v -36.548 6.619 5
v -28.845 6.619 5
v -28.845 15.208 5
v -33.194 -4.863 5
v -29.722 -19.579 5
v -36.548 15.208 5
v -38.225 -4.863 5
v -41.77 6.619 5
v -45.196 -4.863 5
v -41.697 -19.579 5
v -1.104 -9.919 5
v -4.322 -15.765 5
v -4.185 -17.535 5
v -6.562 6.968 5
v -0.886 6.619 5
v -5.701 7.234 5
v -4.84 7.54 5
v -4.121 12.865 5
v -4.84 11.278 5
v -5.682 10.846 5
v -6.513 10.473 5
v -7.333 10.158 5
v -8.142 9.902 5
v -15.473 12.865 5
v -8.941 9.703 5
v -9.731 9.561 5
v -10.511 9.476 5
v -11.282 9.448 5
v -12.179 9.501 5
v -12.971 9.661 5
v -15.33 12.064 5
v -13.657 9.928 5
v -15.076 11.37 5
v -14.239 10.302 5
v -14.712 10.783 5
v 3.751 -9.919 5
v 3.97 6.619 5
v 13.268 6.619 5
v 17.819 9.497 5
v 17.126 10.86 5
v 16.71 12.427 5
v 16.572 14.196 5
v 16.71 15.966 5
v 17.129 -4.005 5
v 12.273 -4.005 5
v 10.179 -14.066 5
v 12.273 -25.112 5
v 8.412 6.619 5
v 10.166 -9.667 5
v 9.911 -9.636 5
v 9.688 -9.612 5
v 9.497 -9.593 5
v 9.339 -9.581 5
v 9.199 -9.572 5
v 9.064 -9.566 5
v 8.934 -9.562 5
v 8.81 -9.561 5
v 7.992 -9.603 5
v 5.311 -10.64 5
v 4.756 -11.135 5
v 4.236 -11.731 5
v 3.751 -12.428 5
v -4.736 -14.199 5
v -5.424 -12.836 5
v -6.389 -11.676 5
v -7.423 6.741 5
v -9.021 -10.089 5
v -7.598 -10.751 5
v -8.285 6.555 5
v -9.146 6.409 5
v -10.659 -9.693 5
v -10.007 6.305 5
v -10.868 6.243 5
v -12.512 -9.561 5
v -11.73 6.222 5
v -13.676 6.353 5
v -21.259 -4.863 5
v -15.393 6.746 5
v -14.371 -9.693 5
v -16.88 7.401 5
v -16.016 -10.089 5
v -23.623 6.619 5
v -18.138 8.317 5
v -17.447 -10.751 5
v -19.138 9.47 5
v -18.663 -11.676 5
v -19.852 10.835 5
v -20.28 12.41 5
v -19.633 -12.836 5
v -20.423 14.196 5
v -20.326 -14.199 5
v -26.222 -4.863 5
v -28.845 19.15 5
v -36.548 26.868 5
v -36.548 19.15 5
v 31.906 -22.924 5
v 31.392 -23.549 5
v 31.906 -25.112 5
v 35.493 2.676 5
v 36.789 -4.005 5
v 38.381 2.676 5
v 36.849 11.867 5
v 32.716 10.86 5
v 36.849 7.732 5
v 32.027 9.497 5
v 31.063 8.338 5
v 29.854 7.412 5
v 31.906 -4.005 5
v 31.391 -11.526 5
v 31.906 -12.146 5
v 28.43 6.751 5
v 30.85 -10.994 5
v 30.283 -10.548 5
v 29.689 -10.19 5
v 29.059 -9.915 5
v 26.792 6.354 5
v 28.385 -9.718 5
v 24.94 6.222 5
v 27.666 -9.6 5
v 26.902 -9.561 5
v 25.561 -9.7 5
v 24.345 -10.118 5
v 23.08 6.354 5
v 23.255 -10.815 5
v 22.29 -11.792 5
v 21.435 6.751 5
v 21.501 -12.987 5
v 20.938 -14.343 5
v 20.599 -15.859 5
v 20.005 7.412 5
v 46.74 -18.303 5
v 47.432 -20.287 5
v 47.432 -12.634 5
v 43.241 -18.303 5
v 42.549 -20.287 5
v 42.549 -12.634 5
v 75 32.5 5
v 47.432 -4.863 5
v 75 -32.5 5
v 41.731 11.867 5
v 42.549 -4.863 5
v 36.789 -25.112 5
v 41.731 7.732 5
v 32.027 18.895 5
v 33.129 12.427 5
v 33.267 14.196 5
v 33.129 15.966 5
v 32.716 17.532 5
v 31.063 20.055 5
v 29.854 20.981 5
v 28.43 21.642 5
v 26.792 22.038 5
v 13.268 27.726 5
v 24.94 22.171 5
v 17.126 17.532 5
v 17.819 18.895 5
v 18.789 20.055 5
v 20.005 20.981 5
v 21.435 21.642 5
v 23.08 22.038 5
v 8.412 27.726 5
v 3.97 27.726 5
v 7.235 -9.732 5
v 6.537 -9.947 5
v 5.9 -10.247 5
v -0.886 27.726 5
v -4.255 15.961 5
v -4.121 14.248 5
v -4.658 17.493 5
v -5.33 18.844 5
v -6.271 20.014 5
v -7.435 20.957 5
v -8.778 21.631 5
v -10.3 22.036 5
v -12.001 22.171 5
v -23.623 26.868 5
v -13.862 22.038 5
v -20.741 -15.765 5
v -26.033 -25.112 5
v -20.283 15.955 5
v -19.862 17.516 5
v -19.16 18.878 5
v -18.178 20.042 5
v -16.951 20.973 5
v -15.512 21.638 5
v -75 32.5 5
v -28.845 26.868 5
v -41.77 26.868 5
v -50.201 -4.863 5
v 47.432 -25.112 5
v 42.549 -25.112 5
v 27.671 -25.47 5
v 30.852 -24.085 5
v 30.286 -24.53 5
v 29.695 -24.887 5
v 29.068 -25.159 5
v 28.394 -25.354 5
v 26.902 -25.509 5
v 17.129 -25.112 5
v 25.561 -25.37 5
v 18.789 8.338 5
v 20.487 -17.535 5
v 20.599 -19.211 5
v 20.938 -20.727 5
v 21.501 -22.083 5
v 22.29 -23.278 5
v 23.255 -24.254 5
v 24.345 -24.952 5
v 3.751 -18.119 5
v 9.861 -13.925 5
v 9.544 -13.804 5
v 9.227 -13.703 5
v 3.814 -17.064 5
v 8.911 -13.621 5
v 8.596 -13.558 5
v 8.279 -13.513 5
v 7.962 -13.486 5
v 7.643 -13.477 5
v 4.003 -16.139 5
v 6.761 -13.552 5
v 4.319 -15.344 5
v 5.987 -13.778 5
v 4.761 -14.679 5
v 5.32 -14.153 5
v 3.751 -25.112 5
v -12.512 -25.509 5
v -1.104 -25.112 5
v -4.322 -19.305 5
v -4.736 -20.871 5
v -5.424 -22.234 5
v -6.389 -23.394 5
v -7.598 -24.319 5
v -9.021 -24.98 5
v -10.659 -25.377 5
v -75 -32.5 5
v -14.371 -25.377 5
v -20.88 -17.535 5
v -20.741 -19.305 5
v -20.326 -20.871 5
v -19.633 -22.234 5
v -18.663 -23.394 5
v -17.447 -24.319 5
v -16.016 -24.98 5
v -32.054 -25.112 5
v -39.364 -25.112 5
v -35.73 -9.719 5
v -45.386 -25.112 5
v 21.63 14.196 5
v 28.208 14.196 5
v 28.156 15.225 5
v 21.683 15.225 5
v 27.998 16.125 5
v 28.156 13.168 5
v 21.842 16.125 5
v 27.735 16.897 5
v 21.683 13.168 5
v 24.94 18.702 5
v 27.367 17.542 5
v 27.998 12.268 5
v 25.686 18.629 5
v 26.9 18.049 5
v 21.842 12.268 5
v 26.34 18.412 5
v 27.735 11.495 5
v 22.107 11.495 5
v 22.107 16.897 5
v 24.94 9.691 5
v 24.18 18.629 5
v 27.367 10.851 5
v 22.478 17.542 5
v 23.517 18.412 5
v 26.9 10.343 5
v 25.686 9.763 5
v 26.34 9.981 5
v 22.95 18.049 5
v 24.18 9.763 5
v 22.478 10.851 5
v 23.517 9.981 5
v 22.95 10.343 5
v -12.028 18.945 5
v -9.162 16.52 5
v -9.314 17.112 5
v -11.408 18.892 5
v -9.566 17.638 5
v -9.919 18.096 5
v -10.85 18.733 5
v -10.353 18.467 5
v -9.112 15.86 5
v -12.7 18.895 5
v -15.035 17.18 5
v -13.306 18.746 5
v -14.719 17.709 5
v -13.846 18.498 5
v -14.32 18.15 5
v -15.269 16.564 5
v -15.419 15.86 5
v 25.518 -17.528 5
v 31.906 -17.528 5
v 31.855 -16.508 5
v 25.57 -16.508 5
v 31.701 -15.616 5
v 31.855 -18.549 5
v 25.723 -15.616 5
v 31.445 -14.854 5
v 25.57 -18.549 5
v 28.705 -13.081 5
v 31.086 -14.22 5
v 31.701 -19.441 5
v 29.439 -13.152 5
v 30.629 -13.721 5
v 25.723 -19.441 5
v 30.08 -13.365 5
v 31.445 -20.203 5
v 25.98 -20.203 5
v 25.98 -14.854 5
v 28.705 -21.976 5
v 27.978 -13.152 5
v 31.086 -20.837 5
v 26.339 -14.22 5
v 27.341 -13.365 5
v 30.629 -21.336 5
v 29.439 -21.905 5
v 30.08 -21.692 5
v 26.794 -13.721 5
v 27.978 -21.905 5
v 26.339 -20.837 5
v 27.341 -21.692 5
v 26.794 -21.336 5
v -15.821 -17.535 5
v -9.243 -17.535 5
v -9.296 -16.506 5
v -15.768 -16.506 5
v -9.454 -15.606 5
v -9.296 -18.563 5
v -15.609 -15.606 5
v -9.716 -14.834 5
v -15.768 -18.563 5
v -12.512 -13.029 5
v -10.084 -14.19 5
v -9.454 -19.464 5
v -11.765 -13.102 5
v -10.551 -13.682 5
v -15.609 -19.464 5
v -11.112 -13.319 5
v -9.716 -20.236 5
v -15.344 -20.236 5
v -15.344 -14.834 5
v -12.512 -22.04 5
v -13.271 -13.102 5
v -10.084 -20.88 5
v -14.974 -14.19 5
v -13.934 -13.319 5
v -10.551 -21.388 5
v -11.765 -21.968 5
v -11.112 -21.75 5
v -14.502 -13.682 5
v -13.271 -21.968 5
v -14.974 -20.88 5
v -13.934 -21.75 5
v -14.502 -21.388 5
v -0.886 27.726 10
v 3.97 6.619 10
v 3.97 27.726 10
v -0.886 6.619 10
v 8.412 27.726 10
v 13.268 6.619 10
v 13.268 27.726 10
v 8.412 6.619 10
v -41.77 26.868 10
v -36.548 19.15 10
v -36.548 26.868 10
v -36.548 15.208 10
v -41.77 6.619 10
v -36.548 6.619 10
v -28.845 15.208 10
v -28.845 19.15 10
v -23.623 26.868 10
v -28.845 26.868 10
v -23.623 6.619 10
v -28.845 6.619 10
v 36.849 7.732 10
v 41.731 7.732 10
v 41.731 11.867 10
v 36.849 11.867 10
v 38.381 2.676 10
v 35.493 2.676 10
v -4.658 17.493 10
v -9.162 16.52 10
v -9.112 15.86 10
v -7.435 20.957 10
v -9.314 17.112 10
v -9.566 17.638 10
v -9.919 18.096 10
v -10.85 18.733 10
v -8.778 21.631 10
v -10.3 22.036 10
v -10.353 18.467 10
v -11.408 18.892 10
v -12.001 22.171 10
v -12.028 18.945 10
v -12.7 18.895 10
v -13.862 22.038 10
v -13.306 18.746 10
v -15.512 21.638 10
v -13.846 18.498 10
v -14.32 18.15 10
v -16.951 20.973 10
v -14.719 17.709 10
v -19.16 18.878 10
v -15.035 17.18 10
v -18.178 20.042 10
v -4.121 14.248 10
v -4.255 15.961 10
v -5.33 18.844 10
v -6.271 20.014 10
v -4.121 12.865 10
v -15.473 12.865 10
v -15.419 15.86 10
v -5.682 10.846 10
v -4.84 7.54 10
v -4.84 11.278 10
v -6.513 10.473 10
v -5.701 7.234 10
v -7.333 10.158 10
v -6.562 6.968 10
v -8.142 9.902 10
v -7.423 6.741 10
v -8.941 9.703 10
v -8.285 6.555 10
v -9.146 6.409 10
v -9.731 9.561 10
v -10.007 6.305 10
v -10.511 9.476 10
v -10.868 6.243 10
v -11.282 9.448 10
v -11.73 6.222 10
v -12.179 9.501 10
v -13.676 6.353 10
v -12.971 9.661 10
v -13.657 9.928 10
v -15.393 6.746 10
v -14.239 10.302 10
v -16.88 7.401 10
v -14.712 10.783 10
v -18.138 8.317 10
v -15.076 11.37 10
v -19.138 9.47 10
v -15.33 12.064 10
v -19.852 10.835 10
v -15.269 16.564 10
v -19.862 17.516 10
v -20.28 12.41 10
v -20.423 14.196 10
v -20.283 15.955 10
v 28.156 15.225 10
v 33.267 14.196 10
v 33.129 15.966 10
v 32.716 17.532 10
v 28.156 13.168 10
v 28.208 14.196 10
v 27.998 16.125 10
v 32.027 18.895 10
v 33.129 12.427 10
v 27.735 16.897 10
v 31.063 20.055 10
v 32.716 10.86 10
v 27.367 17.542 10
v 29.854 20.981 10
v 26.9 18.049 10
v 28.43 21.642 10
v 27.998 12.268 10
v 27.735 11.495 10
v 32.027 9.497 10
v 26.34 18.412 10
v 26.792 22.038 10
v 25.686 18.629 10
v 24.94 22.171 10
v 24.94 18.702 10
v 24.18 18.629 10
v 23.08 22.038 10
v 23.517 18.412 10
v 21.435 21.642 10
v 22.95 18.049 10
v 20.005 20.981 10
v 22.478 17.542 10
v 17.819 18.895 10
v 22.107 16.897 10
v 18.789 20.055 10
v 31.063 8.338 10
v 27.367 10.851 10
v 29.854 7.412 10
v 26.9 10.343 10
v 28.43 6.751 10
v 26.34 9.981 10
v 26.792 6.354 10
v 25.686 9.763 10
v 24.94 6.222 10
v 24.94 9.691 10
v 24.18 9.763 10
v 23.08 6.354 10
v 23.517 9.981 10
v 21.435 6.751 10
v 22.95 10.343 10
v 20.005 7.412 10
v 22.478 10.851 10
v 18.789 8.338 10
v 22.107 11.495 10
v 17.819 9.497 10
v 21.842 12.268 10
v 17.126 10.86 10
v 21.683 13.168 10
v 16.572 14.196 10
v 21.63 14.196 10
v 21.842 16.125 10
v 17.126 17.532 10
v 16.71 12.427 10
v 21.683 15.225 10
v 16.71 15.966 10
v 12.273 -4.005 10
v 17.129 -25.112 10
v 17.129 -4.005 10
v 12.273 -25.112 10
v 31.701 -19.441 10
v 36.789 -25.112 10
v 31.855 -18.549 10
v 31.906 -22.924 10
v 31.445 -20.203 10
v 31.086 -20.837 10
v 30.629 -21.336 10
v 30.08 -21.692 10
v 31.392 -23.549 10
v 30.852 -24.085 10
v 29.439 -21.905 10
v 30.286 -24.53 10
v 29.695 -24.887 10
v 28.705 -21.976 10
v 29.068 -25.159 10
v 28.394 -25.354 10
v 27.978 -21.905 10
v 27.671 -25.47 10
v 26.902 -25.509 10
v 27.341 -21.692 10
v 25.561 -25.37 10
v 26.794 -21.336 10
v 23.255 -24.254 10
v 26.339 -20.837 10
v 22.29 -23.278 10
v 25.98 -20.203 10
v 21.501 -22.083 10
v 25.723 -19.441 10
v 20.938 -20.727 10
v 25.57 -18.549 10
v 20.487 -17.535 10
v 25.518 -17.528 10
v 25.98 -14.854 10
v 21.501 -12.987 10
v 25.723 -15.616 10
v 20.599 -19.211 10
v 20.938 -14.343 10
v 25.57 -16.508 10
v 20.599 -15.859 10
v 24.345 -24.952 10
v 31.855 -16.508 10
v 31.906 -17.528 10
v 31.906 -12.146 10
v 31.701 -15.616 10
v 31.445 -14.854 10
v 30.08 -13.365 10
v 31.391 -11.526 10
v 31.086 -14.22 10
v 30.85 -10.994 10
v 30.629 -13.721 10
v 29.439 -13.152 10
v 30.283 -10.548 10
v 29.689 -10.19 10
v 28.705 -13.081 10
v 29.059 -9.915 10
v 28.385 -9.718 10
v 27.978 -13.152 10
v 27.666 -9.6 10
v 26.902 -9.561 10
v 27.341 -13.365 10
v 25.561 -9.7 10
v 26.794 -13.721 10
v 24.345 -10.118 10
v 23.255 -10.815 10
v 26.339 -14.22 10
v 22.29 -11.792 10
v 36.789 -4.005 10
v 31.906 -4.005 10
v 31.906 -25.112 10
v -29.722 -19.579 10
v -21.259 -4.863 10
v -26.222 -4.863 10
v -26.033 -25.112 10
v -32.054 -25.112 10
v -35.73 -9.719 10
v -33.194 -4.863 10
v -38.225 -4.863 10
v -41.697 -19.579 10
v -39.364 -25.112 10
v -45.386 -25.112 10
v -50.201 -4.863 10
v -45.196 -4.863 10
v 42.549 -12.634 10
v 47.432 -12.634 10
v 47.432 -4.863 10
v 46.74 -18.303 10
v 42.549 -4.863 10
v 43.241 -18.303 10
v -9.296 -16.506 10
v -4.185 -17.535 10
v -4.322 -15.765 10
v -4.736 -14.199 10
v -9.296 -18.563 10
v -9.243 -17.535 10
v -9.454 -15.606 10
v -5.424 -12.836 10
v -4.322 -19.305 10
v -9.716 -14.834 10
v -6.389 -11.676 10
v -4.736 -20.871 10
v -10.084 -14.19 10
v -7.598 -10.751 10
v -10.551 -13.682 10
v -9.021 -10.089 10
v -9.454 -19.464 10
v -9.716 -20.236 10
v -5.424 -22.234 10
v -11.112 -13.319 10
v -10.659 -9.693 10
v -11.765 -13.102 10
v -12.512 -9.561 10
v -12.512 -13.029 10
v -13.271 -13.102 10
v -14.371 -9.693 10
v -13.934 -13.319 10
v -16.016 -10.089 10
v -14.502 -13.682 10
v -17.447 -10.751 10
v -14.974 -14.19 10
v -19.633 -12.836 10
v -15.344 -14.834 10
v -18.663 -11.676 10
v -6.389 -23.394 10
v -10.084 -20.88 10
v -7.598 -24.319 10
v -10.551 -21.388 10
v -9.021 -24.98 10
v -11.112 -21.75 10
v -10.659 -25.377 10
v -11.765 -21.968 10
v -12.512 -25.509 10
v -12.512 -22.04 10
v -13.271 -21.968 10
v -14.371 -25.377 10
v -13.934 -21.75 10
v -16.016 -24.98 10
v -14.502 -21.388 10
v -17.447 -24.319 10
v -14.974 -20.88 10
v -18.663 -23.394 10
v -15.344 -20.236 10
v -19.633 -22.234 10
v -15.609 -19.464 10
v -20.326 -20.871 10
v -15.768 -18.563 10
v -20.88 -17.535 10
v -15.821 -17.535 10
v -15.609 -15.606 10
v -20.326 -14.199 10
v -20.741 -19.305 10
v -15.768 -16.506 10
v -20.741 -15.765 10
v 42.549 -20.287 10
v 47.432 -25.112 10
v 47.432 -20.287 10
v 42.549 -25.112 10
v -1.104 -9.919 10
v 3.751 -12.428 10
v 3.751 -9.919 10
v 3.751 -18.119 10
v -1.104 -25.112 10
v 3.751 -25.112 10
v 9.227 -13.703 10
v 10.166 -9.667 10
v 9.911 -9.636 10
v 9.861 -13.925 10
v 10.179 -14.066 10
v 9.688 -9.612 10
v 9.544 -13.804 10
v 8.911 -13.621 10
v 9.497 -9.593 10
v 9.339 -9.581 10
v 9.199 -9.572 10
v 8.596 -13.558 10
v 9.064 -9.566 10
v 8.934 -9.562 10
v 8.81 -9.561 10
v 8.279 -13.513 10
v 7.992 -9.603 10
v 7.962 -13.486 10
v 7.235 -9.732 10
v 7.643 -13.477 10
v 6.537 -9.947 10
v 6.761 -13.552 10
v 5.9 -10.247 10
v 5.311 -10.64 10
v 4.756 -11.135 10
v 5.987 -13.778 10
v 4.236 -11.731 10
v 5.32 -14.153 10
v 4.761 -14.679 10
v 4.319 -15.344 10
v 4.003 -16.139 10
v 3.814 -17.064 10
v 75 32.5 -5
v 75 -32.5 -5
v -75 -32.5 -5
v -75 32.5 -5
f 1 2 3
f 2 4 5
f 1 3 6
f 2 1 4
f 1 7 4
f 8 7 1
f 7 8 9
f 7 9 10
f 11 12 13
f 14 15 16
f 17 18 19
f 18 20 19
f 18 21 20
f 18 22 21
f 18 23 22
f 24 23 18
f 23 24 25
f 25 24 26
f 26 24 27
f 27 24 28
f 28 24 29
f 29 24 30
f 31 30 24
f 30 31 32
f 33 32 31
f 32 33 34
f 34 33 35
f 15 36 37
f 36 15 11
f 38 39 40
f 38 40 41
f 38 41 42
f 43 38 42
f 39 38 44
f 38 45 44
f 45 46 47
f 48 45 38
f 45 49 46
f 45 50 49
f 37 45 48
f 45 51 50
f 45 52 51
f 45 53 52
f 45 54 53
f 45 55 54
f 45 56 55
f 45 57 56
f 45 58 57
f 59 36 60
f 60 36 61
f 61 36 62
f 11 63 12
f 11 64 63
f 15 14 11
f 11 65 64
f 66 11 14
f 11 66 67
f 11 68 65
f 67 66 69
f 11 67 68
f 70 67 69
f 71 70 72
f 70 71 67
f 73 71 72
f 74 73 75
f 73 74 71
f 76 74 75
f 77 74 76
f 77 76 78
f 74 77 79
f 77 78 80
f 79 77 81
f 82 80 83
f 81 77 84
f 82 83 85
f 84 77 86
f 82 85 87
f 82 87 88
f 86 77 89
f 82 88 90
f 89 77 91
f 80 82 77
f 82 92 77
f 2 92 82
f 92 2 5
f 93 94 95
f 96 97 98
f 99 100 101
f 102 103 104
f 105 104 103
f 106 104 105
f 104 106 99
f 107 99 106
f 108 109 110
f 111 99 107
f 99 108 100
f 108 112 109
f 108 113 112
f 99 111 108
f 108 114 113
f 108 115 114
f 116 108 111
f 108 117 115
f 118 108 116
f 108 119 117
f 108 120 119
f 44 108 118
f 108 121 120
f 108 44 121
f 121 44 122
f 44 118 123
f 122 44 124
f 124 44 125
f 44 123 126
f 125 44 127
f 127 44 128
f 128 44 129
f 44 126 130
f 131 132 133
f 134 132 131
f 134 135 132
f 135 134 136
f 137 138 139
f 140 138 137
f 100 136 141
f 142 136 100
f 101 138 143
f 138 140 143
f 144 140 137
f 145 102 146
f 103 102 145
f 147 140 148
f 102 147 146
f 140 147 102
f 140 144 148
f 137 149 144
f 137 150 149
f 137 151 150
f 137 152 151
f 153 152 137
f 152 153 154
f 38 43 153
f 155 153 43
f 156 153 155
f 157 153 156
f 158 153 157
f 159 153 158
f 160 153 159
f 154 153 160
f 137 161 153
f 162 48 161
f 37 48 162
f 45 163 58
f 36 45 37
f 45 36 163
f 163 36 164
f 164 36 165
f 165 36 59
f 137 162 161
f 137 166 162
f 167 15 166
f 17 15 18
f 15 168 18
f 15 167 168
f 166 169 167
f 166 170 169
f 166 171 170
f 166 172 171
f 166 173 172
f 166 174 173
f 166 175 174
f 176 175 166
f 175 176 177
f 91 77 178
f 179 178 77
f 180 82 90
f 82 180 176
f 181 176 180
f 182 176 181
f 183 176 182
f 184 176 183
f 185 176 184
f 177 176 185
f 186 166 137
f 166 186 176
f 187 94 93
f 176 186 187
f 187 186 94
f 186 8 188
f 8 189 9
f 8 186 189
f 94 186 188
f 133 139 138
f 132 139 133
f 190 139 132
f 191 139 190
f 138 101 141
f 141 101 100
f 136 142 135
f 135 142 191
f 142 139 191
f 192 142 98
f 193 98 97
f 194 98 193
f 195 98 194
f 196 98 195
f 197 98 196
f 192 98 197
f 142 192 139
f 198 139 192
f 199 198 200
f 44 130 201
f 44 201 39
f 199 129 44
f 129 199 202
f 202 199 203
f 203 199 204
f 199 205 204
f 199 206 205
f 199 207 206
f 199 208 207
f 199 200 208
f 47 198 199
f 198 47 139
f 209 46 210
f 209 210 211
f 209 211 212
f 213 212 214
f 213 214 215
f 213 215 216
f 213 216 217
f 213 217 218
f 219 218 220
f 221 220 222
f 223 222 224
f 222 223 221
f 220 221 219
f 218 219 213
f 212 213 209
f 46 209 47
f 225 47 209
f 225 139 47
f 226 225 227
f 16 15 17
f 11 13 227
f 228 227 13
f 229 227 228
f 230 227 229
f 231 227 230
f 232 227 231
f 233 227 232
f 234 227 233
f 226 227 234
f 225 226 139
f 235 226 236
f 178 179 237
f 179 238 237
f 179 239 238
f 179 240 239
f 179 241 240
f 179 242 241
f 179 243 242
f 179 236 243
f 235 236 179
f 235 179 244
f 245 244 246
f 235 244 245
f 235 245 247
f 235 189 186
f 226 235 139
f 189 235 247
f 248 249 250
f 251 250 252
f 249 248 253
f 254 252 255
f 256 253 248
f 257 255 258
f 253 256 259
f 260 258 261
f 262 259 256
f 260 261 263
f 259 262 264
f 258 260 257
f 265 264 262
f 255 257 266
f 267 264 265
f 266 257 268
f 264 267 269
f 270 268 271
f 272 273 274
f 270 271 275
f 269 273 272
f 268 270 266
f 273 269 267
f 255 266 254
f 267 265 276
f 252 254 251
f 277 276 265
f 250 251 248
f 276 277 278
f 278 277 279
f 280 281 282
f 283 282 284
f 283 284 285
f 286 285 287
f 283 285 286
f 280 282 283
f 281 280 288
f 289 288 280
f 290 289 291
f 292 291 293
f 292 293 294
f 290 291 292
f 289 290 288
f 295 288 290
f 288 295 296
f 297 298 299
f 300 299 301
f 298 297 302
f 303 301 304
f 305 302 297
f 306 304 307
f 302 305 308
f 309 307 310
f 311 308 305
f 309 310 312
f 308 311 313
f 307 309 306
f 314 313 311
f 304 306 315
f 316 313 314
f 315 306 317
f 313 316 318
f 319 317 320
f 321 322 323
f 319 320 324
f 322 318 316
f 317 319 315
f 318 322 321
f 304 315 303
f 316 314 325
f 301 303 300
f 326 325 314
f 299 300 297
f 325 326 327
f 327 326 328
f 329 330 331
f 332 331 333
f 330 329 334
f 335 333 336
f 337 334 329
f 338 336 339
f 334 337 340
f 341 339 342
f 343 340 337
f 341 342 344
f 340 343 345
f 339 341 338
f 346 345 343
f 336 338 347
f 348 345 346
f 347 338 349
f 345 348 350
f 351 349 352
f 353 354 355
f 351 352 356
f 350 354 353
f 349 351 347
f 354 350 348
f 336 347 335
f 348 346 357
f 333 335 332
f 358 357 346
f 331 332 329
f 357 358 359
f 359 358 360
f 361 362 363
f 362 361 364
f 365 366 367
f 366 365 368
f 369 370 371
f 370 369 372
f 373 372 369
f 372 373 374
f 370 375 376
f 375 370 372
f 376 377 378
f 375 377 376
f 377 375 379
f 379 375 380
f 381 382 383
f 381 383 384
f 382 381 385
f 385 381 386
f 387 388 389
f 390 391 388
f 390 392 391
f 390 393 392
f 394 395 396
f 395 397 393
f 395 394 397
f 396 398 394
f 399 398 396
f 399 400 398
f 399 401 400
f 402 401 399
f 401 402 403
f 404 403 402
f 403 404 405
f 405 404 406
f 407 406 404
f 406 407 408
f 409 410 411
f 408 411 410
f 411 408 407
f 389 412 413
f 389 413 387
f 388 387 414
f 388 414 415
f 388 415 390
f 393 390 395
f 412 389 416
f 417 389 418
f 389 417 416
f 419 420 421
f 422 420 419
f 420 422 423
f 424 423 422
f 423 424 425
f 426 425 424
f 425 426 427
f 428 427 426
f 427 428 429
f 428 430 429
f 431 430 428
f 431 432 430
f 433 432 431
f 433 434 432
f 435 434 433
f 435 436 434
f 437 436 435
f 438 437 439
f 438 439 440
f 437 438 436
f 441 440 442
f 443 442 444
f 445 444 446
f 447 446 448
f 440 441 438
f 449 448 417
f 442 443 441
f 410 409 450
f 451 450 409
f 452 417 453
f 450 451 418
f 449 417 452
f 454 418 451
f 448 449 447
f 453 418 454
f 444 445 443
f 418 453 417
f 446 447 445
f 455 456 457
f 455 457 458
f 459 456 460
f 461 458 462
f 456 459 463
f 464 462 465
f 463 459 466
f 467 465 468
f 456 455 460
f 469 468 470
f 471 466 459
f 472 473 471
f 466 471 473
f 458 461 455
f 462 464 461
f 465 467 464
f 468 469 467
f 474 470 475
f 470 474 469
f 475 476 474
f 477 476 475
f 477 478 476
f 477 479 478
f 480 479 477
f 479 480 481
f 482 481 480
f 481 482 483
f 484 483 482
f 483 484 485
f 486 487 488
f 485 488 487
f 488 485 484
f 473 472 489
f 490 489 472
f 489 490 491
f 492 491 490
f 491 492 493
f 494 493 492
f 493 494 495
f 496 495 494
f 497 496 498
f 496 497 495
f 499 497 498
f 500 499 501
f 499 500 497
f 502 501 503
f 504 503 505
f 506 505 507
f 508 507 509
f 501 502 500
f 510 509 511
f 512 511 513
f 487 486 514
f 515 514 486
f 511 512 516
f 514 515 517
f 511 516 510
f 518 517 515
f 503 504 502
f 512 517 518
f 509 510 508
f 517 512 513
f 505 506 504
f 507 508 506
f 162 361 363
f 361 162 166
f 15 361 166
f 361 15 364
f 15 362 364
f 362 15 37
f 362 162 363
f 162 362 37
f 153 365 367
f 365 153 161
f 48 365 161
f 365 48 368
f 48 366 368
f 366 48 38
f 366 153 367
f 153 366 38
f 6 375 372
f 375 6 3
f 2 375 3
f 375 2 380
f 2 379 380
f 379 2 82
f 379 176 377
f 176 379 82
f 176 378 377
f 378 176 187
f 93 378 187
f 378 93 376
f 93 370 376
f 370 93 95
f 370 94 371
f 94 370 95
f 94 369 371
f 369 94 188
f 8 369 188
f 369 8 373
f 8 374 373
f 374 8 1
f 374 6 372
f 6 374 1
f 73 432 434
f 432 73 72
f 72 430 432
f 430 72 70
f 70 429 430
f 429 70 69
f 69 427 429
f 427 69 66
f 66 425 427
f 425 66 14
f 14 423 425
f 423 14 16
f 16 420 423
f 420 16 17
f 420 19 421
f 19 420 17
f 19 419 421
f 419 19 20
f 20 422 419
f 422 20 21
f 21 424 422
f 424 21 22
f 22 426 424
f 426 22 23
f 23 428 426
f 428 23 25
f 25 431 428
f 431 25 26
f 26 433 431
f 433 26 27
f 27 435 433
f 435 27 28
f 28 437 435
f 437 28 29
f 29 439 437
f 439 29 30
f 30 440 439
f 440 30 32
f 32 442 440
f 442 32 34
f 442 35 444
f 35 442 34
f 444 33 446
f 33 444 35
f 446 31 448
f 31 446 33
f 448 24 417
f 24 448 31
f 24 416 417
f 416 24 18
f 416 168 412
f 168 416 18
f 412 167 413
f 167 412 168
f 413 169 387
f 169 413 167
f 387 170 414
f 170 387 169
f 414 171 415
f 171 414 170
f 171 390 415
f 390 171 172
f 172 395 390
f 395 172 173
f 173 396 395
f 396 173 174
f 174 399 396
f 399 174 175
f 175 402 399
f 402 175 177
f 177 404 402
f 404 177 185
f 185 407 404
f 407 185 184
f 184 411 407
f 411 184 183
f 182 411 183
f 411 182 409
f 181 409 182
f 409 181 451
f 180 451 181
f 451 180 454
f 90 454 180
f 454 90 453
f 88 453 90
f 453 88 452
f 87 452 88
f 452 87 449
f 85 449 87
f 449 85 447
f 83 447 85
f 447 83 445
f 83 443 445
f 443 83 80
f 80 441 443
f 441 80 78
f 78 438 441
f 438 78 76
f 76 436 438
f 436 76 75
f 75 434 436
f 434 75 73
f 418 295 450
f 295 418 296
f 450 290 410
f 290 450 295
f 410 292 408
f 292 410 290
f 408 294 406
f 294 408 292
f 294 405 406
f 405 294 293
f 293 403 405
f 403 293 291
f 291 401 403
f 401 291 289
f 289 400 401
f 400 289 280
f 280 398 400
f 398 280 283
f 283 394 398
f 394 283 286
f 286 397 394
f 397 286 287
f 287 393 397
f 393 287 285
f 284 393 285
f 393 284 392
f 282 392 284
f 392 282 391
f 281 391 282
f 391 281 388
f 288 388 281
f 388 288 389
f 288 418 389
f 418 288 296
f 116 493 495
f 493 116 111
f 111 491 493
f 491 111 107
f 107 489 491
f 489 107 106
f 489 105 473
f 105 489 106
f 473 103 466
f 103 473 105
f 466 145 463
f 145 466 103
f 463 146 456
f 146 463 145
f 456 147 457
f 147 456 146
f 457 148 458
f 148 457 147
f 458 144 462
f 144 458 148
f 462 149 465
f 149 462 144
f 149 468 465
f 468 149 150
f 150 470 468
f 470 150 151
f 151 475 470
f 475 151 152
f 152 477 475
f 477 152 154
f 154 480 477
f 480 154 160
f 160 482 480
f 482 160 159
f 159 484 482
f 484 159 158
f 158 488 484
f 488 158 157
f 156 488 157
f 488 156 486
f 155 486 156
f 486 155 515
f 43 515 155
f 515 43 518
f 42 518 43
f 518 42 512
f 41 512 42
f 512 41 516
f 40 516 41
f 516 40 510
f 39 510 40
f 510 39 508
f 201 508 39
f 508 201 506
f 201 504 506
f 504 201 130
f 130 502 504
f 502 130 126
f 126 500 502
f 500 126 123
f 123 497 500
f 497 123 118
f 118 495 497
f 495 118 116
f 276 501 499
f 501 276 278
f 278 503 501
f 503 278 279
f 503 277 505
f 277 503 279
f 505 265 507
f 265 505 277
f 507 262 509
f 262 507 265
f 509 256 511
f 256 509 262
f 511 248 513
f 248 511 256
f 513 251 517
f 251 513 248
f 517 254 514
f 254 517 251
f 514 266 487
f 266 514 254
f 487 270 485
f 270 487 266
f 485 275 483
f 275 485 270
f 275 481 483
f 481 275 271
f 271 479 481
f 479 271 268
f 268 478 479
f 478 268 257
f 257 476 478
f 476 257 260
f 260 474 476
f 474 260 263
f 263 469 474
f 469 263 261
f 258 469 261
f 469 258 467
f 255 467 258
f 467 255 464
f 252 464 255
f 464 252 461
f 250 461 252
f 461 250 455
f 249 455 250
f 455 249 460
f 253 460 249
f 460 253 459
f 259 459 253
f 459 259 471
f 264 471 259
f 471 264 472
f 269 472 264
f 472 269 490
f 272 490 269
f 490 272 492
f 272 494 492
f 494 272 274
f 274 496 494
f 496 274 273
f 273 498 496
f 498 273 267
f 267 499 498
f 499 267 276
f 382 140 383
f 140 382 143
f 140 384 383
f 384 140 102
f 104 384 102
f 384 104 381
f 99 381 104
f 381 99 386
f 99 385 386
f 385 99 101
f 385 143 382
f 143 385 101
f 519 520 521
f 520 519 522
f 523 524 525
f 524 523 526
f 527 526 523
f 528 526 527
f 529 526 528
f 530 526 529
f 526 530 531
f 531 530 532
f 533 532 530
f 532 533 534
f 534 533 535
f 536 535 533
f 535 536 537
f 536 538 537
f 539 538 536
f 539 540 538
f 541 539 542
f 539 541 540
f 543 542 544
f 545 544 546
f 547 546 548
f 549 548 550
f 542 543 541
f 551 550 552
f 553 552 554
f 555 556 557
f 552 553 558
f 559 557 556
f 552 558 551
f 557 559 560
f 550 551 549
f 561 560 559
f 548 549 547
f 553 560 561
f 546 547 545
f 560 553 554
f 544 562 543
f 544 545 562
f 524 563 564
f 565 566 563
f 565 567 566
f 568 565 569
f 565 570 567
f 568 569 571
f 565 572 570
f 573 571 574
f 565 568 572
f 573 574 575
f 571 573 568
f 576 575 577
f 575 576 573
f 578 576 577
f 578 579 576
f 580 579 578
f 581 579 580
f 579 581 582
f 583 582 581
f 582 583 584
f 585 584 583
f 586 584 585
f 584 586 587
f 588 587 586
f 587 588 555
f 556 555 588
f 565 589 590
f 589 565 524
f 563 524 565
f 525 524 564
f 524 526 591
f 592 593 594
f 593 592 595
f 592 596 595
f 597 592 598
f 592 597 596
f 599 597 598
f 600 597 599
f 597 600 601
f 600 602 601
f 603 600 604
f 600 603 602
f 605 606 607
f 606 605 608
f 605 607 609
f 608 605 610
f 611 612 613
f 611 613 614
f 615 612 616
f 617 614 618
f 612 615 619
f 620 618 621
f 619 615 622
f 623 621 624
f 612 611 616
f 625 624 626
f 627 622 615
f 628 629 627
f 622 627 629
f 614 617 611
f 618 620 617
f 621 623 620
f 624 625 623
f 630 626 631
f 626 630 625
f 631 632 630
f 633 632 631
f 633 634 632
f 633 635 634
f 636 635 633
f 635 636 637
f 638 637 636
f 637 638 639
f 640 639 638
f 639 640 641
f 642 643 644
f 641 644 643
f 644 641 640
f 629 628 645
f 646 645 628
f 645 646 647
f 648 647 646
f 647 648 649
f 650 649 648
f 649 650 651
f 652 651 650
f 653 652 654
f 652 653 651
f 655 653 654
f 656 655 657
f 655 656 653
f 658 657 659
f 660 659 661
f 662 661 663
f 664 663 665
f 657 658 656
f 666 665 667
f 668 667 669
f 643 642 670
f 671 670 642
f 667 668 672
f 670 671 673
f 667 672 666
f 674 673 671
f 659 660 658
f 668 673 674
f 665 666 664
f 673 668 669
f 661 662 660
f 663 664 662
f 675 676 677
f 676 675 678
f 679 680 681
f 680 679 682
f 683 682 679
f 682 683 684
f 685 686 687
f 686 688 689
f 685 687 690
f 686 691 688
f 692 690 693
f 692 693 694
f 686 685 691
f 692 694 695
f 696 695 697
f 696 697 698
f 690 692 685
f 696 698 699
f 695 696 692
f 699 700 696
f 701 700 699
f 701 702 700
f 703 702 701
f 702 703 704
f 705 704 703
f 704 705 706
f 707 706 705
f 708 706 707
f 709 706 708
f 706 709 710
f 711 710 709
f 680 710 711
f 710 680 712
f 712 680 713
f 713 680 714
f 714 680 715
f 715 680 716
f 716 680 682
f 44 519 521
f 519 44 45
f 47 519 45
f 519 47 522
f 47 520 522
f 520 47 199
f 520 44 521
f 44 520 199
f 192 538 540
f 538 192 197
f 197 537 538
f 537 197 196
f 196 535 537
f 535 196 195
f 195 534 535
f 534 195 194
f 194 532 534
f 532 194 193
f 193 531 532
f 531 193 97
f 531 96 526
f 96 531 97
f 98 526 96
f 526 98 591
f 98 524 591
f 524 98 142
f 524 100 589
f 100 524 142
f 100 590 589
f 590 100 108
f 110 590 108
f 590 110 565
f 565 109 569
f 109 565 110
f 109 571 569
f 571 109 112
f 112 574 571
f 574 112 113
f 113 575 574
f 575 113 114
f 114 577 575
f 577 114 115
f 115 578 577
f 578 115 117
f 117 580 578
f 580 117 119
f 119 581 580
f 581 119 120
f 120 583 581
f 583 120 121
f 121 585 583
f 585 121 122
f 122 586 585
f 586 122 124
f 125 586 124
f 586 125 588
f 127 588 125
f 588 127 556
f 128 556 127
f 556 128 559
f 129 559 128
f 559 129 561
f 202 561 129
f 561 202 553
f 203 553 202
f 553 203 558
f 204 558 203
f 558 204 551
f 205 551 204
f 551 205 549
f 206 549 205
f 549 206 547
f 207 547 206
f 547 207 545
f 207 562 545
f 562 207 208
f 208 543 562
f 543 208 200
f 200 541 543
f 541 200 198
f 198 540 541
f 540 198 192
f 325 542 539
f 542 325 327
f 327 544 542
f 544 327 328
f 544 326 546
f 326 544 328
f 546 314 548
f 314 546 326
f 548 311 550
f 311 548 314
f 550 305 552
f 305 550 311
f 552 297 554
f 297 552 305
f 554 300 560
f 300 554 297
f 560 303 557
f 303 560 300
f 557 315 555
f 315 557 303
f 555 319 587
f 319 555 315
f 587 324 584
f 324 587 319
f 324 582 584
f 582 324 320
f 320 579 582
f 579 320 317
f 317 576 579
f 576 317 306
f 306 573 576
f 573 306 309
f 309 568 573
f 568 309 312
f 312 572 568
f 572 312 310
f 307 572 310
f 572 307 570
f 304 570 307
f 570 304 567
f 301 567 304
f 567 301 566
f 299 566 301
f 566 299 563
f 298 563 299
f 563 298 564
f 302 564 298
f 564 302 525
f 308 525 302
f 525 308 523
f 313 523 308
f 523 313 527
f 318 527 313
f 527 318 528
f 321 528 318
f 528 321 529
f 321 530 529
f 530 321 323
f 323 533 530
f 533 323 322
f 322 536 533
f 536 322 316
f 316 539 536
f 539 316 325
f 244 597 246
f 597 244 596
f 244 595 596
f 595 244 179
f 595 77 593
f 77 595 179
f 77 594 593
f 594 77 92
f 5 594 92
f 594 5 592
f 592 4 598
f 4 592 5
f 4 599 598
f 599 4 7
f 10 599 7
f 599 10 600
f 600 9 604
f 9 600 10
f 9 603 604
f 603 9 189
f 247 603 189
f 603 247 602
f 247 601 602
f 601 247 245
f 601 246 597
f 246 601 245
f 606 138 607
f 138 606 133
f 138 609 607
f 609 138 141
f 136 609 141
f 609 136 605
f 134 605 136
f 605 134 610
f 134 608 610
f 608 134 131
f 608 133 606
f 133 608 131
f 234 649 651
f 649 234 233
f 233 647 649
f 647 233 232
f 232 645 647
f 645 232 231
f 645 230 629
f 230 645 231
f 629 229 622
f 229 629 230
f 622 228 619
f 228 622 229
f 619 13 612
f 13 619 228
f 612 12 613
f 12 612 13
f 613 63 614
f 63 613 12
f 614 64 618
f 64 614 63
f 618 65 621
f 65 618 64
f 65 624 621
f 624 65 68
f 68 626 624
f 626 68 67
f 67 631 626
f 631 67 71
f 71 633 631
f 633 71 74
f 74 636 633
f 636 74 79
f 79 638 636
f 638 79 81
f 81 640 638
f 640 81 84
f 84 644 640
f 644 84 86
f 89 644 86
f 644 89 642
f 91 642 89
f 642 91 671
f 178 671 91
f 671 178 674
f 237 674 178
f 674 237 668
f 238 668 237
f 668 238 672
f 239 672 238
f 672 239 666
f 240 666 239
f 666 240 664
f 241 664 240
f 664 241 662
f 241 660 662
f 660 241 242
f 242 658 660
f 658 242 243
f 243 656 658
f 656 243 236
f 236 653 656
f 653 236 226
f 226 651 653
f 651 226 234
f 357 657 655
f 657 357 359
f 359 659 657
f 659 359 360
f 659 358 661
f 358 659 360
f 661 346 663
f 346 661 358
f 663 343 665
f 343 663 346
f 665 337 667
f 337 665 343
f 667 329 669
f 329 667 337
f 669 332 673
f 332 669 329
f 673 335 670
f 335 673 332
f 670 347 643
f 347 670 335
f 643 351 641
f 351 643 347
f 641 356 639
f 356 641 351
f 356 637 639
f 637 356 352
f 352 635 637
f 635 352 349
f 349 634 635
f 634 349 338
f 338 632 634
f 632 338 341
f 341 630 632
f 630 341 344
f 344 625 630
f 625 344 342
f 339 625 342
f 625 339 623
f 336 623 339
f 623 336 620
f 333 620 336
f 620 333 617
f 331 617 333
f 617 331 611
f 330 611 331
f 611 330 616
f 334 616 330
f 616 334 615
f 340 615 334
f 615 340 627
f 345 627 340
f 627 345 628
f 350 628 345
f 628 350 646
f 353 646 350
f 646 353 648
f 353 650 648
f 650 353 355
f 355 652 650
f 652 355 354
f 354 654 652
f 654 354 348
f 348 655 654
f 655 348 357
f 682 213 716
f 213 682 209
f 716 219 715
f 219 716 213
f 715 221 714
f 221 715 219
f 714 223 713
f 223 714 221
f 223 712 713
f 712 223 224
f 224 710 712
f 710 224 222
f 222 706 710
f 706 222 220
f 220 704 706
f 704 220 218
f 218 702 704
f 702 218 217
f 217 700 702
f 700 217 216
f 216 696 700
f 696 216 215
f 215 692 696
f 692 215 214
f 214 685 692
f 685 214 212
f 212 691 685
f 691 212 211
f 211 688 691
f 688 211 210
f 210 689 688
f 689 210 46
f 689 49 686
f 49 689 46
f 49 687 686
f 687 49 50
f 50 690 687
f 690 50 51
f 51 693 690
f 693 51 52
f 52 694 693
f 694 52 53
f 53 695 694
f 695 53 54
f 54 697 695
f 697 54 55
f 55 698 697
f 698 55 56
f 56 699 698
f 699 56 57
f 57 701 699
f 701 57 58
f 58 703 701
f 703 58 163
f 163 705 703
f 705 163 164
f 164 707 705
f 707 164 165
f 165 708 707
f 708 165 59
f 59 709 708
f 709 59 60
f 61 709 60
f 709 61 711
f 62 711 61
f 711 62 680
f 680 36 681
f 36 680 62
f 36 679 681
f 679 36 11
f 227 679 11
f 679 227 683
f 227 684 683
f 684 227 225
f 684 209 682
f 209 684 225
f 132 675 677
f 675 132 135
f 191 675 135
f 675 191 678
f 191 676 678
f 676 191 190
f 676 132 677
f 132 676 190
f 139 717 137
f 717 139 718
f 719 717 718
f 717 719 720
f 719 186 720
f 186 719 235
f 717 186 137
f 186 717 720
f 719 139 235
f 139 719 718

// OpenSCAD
// *************************
// Customizable Sign Creator
// By BaranCODE
// *************************

// in mm
plate_length = 150;
// in mm
plate_width = 65;
// in mm
plate_height = 10;
// in mm
text_height = 5;
// use \n to add a new line
text_content = "Hello,\nWorld!";
font_size = 20;
// in mm (if you have multiple lines)
line_separation = 30;

color("gray") cube([plate_length, plate_width, plate_height], true);

contents = split(text_content, "\n");
color("white")
translate([0, (len(contents)-1)*line_separation/2, 0])
for (i = [0 : len(contents)-1]){
    translate([0, -i*line_separation, plate_height/2])
    linear_extrude(height = text_height, center = false)
    text(contents[i], font_size,
        "Open Sans:style=Bold",
        halign="center", valign="center");
}



// From OpenSCAD Library by roipoussiere
// http://www.thingiverse.com/thing:1237203
function split(str, sep=" ", i=0, word="", v=[]) =
	i == len(str) ? concat(v, word) :
	str[i] == sep ? split(str, sep, i+1, "", concat(v, word)) :
	split(str, sep, i+1, str(word, str[i]), v);
